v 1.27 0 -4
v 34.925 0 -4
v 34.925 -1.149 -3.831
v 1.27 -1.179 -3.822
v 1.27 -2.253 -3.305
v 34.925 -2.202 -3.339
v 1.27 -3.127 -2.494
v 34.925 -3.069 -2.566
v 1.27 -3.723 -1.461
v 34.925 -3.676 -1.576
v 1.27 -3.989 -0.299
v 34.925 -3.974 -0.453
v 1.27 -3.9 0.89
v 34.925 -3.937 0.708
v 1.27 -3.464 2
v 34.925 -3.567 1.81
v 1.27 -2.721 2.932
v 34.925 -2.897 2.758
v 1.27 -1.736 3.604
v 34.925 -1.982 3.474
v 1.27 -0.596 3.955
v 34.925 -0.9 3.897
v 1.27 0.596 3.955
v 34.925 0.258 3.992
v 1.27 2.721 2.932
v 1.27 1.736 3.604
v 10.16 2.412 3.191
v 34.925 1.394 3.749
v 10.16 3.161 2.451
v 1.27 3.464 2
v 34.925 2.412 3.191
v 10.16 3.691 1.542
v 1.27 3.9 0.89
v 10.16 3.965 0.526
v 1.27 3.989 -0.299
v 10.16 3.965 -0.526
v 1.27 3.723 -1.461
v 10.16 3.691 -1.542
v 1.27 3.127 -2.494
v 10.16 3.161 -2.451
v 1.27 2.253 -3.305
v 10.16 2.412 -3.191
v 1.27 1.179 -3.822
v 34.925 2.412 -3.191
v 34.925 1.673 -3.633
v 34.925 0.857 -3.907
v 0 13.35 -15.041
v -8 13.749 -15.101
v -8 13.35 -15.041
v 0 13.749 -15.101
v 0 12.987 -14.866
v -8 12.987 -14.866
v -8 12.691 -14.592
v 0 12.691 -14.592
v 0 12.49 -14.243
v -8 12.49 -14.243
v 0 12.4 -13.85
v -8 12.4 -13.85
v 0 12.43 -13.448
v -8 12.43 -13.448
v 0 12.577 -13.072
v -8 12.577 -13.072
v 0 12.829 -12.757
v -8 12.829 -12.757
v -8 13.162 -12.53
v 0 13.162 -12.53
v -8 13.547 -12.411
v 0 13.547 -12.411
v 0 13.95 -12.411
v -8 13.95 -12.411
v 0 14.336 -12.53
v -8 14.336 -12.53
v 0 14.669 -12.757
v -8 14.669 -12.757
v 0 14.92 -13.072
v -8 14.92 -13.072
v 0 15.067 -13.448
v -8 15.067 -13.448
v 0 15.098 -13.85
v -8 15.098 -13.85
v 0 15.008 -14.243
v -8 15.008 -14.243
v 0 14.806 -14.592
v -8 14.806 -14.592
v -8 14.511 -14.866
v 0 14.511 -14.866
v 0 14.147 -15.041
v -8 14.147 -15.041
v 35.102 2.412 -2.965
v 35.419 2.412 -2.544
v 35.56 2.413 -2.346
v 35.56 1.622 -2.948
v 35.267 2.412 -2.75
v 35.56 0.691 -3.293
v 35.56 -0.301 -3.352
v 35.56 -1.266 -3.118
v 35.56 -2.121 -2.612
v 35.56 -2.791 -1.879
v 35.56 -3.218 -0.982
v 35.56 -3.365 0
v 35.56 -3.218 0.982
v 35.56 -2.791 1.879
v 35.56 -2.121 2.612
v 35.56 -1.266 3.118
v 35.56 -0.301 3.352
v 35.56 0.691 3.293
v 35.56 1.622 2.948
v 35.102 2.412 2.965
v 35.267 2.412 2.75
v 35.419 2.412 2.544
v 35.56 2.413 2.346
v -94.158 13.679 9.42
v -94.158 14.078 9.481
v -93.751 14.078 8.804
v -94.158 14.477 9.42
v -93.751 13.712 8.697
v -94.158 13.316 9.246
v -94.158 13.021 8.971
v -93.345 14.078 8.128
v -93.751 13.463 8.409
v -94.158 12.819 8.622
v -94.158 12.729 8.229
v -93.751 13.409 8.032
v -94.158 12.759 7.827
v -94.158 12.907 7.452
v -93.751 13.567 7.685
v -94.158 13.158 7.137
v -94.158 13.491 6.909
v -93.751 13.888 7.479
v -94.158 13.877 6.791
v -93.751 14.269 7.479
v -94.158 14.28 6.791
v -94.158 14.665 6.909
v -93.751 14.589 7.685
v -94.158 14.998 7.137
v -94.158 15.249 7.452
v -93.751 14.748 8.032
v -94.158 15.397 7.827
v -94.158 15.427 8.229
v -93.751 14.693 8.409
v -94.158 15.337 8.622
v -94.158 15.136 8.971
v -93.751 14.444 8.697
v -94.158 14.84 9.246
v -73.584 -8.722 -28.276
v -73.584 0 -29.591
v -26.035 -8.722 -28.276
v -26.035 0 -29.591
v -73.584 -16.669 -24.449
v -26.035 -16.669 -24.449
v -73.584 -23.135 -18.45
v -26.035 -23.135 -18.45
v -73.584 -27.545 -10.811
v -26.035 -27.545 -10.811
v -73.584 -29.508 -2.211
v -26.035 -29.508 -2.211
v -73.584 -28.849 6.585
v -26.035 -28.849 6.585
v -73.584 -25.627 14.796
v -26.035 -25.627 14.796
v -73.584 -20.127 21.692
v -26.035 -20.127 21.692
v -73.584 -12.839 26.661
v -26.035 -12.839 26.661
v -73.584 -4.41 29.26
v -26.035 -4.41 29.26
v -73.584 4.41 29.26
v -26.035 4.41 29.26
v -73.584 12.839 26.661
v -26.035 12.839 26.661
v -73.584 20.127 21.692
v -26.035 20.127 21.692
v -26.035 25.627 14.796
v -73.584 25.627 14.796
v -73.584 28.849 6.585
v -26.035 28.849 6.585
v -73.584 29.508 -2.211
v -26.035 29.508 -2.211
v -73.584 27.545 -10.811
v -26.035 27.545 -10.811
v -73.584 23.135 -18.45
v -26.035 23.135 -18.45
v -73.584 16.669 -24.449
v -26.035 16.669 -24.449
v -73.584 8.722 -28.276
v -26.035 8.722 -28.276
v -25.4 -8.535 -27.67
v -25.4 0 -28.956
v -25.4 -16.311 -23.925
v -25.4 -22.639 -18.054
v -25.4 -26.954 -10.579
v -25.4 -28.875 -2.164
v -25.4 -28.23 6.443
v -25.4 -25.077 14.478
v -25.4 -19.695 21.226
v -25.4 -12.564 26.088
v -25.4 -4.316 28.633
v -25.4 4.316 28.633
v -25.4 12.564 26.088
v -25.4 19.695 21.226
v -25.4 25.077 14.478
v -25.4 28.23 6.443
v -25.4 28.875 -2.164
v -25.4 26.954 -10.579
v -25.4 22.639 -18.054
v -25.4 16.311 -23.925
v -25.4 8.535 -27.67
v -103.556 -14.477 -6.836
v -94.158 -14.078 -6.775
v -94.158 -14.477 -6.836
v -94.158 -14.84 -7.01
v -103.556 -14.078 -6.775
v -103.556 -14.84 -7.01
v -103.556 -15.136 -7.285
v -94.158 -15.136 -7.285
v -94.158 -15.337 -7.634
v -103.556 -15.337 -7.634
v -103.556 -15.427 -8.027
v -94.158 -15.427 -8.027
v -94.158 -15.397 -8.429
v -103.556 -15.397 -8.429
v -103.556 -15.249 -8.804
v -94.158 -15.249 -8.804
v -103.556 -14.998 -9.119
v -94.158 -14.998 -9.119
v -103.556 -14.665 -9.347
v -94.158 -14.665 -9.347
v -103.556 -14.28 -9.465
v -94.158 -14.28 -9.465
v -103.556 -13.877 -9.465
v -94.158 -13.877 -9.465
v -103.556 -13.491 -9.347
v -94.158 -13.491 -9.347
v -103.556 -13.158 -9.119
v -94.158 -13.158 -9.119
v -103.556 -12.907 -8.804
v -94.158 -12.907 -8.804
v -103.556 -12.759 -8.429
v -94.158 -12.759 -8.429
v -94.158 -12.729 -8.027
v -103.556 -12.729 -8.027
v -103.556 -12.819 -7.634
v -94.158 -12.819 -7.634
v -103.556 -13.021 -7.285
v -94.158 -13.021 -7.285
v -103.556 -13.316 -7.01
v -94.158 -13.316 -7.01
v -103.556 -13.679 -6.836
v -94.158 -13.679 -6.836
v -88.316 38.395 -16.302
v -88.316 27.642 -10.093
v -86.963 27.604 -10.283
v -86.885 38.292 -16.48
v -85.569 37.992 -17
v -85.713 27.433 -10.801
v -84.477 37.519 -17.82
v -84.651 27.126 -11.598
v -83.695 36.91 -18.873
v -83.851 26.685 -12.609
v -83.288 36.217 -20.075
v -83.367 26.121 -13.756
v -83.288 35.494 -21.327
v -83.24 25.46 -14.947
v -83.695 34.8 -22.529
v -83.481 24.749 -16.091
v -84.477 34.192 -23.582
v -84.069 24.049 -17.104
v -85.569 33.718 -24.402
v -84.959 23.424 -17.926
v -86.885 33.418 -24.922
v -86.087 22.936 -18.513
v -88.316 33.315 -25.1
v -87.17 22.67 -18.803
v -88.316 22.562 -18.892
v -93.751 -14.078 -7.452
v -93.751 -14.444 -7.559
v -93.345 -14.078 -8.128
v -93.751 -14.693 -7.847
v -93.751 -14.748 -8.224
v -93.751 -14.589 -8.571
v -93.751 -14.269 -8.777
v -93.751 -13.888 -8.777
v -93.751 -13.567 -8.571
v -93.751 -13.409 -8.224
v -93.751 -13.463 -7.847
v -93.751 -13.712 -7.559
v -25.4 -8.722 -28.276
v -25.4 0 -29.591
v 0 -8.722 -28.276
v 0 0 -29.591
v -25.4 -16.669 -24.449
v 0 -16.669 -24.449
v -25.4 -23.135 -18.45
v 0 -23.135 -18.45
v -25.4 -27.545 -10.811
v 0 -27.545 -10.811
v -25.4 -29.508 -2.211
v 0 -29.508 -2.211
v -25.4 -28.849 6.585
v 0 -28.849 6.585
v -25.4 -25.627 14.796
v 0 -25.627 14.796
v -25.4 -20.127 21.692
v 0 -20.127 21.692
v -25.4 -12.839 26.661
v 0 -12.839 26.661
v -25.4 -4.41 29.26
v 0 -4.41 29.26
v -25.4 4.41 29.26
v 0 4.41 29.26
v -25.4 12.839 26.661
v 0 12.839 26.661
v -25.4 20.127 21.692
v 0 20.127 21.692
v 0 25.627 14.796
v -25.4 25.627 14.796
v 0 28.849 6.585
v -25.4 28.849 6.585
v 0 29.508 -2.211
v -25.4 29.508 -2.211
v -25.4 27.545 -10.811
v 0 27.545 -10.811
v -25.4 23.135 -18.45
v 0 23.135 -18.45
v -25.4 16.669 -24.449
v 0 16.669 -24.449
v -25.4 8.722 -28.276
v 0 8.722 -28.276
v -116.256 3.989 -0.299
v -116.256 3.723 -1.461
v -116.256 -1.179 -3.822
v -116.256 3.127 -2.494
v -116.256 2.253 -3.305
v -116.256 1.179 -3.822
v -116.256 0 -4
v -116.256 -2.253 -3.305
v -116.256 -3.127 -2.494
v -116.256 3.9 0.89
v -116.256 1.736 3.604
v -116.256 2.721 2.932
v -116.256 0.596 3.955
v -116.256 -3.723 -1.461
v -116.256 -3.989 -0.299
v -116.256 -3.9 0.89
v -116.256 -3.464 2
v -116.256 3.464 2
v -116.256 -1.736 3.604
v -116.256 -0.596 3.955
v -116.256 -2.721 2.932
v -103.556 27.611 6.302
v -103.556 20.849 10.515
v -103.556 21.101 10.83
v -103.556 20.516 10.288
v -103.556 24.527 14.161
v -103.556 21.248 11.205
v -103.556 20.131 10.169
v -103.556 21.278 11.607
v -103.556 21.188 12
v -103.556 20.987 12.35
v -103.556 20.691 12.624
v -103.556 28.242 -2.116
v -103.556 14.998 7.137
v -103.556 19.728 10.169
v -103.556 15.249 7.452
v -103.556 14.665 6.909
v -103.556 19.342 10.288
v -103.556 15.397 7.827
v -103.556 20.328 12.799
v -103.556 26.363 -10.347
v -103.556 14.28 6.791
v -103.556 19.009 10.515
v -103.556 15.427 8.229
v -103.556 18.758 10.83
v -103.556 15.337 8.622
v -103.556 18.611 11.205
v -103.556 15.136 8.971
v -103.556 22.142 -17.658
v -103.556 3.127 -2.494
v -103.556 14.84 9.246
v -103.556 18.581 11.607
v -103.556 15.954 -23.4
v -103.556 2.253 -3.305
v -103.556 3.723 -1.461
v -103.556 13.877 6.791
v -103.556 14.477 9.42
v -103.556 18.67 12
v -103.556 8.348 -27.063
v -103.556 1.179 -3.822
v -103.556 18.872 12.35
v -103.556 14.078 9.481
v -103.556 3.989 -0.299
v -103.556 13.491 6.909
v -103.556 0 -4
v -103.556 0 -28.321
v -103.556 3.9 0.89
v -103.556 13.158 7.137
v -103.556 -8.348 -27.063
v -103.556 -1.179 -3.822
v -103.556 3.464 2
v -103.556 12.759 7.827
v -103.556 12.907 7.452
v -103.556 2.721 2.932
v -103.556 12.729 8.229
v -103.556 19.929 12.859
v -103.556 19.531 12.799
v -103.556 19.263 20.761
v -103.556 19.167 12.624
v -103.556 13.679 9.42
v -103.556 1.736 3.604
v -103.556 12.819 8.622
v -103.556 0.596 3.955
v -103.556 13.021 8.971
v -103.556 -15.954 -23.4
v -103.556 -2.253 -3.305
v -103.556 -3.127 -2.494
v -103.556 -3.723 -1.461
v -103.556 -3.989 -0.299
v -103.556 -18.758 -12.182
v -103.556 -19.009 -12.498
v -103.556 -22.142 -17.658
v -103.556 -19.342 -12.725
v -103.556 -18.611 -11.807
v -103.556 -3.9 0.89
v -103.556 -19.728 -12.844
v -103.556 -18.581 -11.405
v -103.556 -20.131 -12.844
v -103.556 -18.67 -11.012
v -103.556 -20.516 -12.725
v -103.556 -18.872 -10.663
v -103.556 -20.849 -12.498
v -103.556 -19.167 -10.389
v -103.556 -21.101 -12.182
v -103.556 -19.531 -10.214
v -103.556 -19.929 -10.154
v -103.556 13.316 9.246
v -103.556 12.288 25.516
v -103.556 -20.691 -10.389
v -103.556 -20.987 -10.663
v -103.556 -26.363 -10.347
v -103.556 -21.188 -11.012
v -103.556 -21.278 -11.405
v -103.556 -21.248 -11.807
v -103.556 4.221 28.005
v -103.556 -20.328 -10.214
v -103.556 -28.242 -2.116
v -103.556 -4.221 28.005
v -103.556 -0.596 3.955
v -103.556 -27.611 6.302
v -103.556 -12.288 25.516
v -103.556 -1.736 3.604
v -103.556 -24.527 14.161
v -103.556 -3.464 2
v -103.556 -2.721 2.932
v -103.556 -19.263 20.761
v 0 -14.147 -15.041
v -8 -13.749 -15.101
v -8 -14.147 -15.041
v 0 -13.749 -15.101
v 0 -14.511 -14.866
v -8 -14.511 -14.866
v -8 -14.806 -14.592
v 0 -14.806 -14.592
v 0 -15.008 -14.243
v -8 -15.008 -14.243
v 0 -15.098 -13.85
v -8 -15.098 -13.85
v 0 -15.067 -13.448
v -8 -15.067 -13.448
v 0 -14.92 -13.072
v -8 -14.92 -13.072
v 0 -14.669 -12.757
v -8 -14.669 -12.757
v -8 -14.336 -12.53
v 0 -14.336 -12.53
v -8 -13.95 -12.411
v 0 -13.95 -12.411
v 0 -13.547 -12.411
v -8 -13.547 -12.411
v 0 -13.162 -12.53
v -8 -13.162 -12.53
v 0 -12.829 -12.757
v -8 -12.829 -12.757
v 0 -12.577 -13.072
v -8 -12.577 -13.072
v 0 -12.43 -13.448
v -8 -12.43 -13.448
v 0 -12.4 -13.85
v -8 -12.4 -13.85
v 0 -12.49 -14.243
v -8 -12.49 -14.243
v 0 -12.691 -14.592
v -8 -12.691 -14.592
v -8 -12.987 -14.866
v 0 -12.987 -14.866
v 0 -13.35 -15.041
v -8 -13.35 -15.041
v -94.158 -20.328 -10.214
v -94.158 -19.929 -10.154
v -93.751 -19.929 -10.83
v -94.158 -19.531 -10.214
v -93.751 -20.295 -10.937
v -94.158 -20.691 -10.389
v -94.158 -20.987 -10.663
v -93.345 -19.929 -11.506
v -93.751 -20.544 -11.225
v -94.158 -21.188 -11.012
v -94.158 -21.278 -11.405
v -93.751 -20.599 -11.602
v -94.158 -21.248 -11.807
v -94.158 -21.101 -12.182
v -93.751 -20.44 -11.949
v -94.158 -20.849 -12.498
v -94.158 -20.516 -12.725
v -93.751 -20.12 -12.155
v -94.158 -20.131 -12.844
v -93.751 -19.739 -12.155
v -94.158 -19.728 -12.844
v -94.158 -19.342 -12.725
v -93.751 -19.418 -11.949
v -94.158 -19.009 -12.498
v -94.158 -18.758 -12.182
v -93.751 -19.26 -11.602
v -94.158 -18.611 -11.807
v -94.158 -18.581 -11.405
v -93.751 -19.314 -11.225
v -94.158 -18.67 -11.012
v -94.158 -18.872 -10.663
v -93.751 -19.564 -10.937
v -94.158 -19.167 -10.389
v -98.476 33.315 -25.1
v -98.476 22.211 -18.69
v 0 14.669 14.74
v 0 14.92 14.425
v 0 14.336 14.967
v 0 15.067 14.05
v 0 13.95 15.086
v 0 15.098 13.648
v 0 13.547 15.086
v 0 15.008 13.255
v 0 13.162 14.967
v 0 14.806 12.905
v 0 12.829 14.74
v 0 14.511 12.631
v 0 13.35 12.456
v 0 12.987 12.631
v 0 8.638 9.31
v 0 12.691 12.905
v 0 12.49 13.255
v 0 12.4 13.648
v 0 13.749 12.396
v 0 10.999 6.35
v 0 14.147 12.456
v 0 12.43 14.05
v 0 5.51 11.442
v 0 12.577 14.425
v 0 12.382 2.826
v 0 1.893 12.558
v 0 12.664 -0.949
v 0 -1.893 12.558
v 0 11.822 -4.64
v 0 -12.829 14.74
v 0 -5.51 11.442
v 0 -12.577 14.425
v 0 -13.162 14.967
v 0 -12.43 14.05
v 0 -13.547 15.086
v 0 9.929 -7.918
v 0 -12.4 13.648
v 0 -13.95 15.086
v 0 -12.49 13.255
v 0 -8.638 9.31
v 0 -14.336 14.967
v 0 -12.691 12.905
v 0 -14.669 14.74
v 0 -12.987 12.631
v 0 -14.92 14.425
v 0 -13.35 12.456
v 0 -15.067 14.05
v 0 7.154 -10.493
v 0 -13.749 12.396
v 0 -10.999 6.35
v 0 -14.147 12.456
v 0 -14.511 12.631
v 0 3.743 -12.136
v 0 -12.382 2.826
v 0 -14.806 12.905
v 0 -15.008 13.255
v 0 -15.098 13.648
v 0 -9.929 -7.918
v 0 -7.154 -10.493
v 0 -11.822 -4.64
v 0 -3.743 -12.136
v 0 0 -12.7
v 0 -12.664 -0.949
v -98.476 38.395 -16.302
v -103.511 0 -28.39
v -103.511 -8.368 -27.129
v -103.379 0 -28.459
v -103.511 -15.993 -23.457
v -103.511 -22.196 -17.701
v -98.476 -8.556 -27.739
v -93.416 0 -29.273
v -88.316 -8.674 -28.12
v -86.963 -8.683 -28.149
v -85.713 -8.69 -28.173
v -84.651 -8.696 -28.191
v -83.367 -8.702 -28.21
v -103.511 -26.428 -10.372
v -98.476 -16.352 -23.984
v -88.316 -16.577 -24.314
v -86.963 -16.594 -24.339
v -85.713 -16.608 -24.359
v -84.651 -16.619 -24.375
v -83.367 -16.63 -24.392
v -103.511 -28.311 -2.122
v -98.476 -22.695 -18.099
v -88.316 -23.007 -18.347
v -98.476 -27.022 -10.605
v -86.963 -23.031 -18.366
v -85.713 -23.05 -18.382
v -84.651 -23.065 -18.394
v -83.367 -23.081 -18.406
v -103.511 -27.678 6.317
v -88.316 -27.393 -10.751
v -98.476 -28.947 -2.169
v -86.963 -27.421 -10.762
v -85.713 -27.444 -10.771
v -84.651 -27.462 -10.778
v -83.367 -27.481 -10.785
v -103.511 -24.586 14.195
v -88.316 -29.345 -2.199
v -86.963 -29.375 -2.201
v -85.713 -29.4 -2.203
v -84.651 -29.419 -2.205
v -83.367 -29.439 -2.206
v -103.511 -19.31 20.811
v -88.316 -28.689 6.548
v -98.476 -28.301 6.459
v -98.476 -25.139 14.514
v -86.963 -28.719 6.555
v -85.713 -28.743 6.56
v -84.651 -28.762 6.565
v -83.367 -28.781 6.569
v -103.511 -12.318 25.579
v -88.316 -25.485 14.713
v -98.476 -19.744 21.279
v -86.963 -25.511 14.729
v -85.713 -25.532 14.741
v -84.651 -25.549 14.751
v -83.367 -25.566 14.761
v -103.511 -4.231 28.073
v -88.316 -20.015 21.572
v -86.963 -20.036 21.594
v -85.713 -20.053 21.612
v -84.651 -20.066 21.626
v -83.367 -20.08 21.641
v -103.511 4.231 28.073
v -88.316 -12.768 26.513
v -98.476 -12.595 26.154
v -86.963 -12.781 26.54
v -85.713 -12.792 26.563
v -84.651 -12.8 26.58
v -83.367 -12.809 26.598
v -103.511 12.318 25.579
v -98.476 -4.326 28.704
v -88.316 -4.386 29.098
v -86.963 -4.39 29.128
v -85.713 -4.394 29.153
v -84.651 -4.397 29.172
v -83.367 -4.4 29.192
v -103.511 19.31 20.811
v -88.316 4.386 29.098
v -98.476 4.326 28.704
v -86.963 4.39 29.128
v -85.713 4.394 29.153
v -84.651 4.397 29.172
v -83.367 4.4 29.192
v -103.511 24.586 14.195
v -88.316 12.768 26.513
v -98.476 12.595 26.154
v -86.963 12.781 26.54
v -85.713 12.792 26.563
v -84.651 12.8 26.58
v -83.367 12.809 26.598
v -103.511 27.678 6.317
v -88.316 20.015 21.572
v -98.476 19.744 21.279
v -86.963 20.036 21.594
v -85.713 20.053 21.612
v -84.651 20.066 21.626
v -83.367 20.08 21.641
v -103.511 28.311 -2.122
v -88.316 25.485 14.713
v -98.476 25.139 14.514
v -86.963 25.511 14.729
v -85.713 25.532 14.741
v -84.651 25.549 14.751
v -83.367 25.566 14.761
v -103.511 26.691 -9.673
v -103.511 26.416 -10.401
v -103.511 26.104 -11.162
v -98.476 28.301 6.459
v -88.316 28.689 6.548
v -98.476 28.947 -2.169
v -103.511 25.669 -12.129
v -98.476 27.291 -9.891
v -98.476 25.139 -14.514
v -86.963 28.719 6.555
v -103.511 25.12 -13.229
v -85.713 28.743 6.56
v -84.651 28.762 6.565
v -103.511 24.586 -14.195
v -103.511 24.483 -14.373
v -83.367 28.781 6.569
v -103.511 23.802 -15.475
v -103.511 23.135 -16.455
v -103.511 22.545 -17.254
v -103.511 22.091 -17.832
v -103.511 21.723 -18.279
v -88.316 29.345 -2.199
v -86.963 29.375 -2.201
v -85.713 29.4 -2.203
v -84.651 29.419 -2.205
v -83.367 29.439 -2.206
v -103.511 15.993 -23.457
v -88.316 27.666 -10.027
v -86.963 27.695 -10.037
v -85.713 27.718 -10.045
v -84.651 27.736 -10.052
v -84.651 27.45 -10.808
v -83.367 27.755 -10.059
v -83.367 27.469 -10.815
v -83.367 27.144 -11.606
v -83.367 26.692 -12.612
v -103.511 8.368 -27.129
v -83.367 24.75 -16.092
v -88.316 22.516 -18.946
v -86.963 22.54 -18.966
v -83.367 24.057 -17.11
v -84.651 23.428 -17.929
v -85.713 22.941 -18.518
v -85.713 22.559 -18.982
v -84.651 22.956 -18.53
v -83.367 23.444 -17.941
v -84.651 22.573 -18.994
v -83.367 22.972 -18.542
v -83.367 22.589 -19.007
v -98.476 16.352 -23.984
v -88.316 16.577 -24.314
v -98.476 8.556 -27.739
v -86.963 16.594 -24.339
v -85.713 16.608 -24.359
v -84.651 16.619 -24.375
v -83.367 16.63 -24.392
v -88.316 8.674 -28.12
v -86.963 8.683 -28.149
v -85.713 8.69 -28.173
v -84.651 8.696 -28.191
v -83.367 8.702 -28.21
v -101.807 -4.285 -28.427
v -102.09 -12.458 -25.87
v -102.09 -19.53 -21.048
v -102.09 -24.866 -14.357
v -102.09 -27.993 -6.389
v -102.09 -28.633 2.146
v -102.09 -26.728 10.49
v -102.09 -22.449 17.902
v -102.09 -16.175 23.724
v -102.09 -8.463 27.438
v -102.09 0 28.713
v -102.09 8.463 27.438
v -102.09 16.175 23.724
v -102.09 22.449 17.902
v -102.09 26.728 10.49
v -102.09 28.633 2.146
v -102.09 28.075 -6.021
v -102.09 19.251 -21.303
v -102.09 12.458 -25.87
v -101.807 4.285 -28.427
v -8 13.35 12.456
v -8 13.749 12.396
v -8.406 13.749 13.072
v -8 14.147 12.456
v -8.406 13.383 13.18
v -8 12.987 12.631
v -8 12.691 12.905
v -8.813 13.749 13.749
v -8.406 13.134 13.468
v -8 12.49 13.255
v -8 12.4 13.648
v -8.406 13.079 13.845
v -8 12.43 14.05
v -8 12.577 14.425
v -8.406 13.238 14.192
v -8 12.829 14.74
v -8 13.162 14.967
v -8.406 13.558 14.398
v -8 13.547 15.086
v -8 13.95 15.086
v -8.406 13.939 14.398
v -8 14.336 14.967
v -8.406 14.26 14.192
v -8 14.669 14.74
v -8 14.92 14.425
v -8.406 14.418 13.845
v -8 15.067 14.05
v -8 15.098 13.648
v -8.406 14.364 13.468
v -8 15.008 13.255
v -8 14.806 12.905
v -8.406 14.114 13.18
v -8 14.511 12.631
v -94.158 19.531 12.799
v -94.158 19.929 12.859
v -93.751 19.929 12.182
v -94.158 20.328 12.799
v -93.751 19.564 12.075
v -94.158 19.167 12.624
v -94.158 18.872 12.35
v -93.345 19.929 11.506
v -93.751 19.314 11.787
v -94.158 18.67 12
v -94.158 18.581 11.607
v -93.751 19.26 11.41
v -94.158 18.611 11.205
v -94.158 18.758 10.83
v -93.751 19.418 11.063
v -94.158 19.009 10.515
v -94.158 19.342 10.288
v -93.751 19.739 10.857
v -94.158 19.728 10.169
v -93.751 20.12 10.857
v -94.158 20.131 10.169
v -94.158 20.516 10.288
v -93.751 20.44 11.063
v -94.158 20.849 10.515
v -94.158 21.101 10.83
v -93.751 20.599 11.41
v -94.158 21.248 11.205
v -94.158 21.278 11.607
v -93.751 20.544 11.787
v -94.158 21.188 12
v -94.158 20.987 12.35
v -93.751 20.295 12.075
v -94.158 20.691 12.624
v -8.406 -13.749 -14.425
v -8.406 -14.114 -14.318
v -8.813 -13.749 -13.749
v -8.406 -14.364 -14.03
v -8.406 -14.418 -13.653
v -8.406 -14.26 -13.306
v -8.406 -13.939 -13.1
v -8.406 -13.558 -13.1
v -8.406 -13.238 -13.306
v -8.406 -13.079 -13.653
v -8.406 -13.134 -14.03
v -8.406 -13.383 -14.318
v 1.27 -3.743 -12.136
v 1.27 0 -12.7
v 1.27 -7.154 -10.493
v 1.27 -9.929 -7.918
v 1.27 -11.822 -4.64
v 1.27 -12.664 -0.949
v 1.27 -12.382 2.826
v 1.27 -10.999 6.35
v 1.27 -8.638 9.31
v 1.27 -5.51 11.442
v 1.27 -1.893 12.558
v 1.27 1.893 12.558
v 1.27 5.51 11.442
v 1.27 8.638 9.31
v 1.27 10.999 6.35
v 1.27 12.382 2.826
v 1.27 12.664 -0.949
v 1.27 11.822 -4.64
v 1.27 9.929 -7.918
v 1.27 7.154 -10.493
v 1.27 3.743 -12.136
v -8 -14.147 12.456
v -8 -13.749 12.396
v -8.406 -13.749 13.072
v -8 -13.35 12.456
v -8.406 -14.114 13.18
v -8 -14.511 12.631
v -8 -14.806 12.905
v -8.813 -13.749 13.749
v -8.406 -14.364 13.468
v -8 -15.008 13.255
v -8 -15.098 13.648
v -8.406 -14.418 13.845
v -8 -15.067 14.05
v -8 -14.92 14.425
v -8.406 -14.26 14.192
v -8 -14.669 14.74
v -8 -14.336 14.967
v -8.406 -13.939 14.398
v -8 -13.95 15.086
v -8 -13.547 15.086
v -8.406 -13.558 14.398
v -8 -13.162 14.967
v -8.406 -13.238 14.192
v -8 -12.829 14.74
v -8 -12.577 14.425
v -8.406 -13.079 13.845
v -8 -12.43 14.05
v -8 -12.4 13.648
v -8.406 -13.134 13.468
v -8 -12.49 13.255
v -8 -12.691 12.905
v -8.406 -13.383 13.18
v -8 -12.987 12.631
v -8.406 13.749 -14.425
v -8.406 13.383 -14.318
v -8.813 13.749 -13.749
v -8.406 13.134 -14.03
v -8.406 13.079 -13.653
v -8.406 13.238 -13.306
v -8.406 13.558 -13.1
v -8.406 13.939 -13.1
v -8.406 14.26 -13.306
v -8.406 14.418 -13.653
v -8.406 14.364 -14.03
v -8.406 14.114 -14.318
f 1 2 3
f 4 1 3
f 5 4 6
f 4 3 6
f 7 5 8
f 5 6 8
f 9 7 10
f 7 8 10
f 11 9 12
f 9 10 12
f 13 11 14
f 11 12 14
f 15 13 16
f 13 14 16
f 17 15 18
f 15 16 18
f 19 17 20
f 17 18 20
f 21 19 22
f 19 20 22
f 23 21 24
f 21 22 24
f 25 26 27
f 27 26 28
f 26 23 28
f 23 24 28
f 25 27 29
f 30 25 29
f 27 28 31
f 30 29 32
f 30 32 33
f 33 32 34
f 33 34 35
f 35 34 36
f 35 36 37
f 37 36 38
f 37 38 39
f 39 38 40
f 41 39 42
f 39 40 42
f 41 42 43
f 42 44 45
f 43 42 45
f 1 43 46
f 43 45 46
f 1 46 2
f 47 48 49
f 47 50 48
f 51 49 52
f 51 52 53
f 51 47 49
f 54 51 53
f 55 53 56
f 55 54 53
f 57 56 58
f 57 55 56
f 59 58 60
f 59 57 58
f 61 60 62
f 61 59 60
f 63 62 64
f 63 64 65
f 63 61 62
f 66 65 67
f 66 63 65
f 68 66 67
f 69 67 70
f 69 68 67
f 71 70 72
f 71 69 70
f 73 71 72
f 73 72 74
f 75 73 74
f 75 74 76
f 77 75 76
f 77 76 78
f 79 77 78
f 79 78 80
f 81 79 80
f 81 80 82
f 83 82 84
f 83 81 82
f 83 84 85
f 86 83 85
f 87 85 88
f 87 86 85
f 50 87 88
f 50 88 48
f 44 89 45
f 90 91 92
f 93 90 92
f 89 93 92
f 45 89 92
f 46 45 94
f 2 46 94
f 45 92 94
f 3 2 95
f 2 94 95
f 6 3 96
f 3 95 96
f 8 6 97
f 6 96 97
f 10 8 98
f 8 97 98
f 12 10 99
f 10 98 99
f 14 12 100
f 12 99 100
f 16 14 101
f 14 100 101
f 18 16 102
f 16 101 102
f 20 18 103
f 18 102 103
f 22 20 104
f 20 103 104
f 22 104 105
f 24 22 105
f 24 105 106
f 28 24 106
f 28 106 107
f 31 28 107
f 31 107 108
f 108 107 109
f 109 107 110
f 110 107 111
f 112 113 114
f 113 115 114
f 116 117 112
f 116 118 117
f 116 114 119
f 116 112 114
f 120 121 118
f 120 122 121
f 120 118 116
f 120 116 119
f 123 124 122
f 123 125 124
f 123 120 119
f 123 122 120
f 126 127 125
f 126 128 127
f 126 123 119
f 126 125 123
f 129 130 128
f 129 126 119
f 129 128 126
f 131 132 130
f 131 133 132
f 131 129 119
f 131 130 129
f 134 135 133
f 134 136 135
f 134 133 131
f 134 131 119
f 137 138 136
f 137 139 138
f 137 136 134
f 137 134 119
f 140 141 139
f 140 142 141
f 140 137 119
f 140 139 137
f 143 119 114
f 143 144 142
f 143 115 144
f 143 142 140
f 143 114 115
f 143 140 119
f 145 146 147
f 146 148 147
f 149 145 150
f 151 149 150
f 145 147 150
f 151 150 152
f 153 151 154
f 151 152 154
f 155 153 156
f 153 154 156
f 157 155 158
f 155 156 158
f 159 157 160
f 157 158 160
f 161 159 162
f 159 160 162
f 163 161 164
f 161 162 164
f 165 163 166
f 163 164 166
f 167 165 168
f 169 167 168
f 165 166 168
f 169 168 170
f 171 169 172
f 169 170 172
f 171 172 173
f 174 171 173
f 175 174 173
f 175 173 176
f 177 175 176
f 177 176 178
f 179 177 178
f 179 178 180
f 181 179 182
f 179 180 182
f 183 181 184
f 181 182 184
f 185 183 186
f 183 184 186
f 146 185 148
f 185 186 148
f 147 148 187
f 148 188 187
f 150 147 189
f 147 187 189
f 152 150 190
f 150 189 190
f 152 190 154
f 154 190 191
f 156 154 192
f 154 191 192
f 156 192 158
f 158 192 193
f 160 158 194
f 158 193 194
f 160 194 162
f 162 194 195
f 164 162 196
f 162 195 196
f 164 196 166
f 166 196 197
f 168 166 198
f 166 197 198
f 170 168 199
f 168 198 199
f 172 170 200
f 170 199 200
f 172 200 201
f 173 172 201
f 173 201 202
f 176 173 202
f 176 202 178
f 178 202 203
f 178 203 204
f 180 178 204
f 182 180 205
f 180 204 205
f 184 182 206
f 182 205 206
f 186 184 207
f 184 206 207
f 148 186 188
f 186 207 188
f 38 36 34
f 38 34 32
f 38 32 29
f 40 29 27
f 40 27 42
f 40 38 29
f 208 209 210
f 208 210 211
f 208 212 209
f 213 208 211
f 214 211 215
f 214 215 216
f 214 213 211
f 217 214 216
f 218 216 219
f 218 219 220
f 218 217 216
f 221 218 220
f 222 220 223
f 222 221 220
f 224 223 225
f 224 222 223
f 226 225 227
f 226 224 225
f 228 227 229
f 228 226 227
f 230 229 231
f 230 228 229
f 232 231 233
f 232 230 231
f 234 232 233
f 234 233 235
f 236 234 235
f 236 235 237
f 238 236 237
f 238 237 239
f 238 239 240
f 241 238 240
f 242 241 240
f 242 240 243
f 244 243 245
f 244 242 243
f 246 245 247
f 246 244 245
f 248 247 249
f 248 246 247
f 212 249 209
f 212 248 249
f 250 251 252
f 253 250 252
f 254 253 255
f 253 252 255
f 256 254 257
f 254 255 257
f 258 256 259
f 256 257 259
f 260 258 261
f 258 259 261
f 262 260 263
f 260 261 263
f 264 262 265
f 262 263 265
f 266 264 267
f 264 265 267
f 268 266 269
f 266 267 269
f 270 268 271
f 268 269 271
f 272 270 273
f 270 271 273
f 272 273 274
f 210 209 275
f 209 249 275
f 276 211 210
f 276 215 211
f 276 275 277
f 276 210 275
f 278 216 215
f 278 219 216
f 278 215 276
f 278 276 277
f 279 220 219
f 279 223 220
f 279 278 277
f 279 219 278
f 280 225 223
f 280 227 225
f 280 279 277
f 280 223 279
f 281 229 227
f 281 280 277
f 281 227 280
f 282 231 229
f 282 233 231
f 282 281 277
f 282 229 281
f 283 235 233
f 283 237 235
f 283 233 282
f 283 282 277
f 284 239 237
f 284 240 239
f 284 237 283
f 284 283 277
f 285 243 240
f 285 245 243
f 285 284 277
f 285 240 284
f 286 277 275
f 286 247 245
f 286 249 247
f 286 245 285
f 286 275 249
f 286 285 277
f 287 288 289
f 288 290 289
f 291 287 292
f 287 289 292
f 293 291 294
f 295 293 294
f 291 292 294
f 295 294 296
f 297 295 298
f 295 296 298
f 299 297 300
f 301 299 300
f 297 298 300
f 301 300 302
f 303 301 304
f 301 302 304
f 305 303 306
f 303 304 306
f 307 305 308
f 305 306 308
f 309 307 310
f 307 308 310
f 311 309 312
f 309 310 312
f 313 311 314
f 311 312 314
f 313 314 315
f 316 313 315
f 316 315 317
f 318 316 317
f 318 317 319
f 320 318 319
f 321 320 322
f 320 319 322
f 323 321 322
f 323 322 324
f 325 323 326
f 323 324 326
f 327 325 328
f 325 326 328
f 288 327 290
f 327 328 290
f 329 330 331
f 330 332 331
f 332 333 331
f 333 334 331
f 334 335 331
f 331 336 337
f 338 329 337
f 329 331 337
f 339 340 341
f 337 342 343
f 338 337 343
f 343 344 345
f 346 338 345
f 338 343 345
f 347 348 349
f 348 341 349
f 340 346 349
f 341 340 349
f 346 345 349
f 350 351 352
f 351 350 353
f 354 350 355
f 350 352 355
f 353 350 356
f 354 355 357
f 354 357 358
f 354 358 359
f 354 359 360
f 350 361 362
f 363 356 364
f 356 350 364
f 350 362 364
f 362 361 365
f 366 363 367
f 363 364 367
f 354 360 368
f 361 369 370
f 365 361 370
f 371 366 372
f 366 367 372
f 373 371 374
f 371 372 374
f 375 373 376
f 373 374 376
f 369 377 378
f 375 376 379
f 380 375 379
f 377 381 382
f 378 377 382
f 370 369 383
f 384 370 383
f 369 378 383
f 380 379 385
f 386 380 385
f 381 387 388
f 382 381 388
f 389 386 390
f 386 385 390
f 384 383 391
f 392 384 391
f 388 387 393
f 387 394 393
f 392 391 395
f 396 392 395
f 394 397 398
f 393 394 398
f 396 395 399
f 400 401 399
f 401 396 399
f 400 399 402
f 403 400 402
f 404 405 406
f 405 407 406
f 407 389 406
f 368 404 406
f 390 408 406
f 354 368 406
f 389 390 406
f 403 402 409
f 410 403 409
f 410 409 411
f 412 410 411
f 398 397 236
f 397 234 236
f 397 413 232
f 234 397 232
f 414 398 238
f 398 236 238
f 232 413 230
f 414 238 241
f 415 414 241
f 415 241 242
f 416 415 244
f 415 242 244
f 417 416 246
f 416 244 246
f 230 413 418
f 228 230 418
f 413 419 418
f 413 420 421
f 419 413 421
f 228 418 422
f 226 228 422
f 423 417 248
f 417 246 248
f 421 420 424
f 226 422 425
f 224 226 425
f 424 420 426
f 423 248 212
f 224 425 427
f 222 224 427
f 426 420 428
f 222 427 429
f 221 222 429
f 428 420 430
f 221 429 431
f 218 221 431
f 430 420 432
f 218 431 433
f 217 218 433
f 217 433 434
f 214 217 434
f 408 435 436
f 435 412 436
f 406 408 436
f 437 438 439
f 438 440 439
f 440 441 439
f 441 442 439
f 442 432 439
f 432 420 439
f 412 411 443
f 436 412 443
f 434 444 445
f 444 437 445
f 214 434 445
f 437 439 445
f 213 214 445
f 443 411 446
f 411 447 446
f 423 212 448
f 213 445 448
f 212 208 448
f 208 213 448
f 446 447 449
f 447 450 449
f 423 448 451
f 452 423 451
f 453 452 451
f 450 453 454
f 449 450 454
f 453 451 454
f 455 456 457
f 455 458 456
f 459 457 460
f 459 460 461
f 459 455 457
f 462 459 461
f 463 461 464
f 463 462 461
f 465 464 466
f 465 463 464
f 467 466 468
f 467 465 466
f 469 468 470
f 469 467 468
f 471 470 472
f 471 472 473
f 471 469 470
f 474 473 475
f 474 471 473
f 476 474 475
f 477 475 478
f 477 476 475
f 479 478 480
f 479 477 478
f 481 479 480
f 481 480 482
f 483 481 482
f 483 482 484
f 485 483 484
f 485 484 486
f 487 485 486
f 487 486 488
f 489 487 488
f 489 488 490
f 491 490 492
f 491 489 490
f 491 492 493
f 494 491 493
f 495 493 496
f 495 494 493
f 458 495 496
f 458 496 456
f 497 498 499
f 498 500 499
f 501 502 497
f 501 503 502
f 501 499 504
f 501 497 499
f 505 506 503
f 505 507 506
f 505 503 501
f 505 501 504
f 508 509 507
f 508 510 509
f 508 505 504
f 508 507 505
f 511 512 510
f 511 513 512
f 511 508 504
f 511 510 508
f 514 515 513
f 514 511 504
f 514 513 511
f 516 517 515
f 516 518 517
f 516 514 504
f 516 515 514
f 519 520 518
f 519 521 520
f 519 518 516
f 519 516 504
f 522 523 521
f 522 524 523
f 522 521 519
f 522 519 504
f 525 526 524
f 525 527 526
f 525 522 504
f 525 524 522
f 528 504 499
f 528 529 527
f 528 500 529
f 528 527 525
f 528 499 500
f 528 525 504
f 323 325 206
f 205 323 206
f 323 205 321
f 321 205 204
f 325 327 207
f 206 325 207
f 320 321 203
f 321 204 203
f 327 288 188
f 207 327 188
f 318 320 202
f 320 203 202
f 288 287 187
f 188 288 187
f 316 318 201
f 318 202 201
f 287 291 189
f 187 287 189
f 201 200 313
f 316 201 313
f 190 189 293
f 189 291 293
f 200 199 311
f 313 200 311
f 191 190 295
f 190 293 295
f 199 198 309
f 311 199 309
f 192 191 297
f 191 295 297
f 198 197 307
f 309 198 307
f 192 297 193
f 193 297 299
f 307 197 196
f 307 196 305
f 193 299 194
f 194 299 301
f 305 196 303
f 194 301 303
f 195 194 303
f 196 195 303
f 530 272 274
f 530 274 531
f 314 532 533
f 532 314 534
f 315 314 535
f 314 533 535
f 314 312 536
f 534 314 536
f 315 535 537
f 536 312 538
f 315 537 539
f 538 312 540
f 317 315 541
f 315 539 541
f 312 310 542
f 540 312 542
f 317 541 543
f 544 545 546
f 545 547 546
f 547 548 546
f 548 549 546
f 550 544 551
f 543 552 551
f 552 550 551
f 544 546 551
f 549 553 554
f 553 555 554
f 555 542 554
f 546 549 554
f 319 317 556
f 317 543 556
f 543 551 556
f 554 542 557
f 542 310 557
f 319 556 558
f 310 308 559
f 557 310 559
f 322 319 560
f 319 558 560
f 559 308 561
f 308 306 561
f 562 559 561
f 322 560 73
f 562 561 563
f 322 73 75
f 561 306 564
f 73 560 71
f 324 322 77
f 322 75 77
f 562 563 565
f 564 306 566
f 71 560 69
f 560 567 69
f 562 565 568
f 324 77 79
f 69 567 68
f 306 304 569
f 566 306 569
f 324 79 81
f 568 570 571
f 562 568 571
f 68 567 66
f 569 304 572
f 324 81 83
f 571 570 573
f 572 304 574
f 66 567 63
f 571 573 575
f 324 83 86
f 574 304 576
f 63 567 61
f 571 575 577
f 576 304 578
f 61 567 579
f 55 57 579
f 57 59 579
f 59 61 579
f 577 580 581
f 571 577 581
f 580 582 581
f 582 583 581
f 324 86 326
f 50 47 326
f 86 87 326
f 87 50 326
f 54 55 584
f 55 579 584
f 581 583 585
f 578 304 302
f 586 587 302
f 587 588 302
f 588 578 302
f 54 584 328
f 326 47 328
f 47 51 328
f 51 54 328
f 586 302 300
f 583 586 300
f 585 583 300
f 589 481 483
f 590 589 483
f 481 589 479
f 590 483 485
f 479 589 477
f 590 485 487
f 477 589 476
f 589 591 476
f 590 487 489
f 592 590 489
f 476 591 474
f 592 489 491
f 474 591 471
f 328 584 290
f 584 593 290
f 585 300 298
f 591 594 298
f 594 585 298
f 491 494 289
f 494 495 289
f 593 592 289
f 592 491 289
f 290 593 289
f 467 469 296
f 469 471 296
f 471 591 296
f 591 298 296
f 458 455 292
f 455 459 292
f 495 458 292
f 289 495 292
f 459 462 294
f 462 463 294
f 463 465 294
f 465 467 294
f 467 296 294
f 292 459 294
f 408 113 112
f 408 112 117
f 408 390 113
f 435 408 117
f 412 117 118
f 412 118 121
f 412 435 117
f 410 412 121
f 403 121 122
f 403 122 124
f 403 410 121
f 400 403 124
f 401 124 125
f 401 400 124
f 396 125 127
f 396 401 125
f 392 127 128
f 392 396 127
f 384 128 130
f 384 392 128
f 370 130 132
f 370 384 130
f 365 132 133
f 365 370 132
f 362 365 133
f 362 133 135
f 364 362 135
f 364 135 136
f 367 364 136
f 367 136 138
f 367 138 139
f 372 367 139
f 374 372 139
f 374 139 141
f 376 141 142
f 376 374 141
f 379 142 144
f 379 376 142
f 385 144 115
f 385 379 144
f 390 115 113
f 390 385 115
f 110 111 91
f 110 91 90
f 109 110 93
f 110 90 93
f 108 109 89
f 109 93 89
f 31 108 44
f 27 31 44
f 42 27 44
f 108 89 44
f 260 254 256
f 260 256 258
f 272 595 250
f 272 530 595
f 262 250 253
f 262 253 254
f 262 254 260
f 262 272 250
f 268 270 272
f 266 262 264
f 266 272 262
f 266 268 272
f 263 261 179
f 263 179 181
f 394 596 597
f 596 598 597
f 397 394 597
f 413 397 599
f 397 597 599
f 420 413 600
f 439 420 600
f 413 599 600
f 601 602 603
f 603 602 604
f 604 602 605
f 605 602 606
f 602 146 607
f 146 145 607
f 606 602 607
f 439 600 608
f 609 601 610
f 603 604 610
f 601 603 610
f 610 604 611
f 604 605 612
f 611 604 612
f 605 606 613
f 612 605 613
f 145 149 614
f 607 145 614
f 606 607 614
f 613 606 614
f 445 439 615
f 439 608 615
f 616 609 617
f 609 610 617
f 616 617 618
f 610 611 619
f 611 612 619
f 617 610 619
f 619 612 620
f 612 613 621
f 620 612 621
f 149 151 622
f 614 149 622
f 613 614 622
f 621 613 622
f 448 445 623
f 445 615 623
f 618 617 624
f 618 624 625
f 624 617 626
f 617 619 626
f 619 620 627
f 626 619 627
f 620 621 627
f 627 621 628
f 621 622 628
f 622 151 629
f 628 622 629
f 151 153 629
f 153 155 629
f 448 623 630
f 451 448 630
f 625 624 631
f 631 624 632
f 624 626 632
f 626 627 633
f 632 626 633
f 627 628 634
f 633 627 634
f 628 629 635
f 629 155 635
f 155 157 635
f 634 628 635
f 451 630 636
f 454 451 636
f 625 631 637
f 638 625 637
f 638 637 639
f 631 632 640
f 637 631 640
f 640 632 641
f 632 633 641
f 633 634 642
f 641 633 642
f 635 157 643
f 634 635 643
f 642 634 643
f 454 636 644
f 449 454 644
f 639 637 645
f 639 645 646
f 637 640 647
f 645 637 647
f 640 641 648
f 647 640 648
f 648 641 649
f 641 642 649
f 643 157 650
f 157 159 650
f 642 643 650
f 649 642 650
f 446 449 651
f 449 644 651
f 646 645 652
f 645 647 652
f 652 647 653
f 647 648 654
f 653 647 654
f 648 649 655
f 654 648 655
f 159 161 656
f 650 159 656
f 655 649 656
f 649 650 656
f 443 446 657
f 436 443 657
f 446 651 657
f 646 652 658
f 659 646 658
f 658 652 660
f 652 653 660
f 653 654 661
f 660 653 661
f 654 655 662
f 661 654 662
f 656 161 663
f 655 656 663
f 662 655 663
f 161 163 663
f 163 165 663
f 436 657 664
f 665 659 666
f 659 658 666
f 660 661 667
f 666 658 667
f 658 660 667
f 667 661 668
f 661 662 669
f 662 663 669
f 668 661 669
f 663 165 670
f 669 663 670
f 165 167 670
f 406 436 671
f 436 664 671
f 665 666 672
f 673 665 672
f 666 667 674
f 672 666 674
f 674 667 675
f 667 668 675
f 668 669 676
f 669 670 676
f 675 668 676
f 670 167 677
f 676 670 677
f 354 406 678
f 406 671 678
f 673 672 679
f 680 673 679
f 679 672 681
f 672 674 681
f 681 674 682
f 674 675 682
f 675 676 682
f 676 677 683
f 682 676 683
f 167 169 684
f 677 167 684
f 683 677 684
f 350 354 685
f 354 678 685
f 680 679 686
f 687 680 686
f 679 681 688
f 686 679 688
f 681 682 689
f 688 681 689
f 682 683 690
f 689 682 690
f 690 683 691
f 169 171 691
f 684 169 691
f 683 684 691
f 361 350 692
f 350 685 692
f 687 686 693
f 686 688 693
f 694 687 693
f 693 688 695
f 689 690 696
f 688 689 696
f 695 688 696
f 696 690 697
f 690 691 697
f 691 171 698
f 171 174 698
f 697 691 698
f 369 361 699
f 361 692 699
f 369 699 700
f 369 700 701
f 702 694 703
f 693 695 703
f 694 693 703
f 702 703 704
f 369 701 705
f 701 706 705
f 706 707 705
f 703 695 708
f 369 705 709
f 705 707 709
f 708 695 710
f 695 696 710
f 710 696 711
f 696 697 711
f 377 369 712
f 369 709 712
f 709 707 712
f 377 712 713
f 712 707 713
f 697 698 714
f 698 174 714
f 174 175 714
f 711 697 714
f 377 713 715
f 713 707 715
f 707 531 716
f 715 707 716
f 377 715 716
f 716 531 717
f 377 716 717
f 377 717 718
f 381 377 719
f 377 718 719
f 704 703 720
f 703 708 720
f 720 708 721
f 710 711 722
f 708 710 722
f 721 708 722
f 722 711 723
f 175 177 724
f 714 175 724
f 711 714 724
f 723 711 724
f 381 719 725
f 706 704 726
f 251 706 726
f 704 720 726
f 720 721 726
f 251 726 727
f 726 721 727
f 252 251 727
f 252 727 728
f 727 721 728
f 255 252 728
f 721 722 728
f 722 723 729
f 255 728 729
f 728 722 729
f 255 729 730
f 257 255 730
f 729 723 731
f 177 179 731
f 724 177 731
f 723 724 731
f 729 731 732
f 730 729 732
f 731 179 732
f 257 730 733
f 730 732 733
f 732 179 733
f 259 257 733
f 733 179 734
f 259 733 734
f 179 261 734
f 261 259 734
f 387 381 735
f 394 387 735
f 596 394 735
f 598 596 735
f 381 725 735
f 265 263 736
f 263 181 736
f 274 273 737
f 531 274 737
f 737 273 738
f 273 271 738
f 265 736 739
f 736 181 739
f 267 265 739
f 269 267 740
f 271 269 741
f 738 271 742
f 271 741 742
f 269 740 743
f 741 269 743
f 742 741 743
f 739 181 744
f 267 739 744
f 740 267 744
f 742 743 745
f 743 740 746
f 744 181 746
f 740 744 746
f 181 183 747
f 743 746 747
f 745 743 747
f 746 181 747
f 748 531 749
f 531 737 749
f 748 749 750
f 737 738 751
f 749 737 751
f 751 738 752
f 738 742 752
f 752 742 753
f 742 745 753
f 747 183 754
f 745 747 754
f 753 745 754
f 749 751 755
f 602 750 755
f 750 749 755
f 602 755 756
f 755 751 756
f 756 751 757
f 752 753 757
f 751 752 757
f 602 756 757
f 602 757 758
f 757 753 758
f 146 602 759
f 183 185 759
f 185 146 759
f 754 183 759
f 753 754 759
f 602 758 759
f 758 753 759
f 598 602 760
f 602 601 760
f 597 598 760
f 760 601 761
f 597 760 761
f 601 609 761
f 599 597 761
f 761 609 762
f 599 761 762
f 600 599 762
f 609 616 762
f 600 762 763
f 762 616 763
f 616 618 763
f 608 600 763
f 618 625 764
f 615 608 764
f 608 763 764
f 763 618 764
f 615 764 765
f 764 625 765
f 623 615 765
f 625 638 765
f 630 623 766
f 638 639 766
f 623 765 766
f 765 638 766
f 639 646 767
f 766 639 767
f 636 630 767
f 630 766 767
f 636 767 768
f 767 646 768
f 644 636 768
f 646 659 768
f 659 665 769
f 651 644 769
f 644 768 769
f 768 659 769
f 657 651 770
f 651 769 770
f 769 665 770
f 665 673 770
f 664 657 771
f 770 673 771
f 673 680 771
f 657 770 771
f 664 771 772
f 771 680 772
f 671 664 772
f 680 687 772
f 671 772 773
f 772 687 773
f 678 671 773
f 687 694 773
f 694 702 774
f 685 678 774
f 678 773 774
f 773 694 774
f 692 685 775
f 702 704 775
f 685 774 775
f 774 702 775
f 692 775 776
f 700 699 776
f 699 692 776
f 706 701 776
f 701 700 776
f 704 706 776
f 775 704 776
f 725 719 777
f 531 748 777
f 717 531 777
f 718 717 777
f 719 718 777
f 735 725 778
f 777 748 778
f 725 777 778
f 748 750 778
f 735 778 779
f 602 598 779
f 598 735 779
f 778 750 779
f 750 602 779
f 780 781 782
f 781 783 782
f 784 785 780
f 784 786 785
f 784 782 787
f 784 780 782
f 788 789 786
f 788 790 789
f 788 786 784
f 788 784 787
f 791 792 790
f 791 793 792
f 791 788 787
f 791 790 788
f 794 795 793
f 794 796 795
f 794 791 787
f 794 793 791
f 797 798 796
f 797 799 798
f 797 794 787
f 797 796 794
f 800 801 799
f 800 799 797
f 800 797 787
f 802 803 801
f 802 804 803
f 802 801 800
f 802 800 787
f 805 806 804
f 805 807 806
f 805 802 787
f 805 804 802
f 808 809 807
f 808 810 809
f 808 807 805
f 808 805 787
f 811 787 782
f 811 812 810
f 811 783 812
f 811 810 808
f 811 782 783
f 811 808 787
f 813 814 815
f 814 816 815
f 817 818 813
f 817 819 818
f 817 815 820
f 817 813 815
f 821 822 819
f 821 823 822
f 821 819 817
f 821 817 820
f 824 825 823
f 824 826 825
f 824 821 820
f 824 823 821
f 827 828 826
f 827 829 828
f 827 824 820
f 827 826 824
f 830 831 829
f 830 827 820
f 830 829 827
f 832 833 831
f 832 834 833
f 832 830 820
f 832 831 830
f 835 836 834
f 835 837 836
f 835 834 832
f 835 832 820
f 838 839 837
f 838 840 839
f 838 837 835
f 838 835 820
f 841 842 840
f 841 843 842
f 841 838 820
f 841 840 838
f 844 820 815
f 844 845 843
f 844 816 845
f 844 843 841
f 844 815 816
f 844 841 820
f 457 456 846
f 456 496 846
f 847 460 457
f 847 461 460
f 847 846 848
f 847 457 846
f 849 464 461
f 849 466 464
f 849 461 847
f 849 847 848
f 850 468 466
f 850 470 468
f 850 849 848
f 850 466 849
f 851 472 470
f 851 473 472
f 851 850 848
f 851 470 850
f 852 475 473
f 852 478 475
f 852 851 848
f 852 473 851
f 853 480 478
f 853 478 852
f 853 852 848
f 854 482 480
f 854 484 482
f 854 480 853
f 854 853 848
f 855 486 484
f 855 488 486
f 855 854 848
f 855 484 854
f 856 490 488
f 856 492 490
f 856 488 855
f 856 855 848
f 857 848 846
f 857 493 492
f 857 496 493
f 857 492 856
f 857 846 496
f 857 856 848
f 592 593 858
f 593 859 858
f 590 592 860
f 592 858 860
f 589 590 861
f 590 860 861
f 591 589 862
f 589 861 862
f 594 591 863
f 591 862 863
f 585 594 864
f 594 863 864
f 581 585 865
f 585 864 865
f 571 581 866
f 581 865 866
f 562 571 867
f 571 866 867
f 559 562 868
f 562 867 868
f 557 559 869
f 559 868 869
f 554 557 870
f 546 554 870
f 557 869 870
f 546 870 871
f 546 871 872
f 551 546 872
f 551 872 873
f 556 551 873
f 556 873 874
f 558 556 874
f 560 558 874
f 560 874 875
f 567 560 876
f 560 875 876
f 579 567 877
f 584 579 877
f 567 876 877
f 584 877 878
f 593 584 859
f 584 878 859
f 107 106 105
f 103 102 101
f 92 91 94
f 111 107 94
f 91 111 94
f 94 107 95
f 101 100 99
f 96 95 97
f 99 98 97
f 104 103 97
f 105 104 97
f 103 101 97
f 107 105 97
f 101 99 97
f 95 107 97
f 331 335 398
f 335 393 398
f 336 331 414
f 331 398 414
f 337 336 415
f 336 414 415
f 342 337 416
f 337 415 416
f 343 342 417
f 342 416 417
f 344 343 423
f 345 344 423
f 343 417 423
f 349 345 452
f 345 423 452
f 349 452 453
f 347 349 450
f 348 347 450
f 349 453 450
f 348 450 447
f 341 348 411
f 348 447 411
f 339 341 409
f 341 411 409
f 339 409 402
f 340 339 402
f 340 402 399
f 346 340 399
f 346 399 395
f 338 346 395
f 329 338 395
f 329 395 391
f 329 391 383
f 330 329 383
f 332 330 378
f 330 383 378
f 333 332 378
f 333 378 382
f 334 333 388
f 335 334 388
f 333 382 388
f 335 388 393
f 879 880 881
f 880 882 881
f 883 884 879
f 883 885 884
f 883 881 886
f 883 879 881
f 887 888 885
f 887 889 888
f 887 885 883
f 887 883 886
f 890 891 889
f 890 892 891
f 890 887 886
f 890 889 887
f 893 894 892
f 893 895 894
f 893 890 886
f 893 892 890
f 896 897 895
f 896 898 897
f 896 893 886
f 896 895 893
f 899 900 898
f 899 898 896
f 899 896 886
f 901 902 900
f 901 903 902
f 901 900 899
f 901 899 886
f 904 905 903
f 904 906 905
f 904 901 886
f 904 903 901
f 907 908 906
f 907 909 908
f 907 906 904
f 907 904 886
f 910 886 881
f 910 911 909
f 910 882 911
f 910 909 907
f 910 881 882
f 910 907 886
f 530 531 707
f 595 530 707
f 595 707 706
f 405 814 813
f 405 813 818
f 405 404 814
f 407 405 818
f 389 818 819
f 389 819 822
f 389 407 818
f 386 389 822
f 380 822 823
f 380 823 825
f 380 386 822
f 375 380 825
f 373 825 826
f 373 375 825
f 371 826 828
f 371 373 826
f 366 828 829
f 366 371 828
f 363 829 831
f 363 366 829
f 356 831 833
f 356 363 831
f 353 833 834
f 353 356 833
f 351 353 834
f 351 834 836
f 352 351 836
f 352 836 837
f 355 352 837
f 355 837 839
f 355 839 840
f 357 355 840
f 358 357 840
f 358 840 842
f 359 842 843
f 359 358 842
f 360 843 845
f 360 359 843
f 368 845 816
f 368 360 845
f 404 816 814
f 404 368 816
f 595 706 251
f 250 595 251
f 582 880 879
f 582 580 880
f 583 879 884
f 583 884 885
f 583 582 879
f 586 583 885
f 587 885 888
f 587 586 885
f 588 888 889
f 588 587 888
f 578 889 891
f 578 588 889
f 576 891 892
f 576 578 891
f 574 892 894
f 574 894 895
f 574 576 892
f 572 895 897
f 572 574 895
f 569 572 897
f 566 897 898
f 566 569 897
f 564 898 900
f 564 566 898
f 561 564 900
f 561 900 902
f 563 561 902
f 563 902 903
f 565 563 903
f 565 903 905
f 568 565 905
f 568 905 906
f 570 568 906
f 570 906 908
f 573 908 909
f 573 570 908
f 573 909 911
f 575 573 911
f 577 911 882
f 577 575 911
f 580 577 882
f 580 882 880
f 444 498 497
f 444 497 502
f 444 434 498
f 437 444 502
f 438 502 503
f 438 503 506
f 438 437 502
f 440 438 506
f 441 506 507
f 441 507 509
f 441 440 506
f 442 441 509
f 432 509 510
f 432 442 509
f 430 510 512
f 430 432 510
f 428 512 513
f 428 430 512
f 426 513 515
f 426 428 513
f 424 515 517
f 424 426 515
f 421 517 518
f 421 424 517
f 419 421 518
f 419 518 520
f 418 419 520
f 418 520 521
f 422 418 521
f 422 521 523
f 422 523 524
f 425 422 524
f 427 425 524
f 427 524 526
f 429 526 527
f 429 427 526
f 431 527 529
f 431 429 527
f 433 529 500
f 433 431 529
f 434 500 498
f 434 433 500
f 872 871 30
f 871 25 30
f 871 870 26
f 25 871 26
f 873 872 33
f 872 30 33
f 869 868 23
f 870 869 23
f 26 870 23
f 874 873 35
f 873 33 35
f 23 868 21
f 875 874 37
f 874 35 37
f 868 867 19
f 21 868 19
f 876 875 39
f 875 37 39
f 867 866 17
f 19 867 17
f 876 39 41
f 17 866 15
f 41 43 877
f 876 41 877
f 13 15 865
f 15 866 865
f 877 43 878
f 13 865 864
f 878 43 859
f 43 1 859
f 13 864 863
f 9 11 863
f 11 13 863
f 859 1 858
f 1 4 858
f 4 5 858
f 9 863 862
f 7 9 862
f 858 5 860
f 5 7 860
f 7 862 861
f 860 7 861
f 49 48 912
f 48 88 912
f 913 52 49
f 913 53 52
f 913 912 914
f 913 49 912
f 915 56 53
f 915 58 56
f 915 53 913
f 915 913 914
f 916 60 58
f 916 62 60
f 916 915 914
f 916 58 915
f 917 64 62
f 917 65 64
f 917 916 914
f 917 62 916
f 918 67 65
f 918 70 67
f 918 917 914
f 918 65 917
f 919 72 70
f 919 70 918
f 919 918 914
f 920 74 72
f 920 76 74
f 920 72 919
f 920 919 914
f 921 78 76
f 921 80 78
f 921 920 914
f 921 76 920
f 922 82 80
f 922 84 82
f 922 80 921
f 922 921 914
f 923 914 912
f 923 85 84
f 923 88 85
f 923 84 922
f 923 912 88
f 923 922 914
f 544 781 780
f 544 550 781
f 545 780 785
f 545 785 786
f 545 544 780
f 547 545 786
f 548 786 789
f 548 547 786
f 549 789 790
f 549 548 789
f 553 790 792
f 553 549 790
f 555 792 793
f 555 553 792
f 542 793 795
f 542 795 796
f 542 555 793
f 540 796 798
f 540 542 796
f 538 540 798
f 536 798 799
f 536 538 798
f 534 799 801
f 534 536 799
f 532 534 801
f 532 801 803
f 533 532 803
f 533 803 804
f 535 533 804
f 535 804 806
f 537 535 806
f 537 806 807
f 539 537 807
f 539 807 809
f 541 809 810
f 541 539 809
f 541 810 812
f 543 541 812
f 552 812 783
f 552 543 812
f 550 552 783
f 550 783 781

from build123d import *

# Parameters (mm, degrees)
FILLET1_SIZE                   = 1.27
FILLET1_SIZE_2                 = 29.972
SKETCH3_W                      = 6.381173482
SKETCH3_H                      = 3.175
CUT_EXTRUDE1_DEPTH             = 25.4
F_6_32_TAPPED_HOLE2_AT_2_COUNT = 2
F_6_32_TAPPED_HOLE2_AT_2_PITCH = 27.497544243
F_6_32_TAPPED_HOLE2_AT_3_COUNT = 2
F_6_32_TAPPED_HOLE2_AT_3_PITCH = 38.8874
F_6_32_TAPPED_HOLE2_AT_4_COUNT = 2
F_6_32_TAPPED_HOLE2_AT_4_PITCH = 27.497544243
F_6_32_TAPPED_HOLE1_AT_2_COUNT = 2
F_6_32_TAPPED_HOLE1_AT_2_PITCH = 46.0248
F_6_32_TAPPED_HOLE1_AT_3_COUNT = 2
F_6_32_TAPPED_HOLE1_AT_3_PITCH = 39.2684
F_6_32_TAPPED_HOLE1_AT_4_COUNT = 2
F_6_32_TAPPED_HOLE1_AT_4_PITCH = 6.7564
BOSS_EXTRUDE1_DEPTH            = 41.402


with BuildPart() as part:
    # Sketch2 → Revolve1 (revolve)
    with BuildSketch(Plane.XY, mode=Mode.PRIVATE) as revolve1_sk:
        Polygon((35.56, 0), (-116.2558, 0), (-116.2558, 4), (-103.5558, 4), (-103.5558, 29.591), (-26.035, 29.591), (-25.4, 28.956), (-25.4, 29.591), (0, 29.591), (0, 12.7), (1.27, 12.7), (1.27, 4), (34.925, 4), (35.56, 3.365), align=None)
    revolve(revolve1_sk.sketch.rotate(Axis((88.99, 0, 0), (-1, 0, 0)), 90), axis=Axis((88.99, 0, 0), (-1, 0, 0)))

    # Fillet1
    # an asymmetric fillet: 29.972, 1.27 mm, written as the material it takes off along each edge
    with BuildSketch(Plane(origin=(-103.5558, 0, 0), x_dir=(0, 0, -1), z_dir=(0, 1, 0))) as fillet1_piece_1:
        with BuildLine():
            Bezier((29.591 - FILLET1_SIZE, 0), (29.591, 0), (29.591, -FILLET1_SIZE_2), weights=[1, 0.707106781, 1])
            Line((29.591, -FILLET1_SIZE_2), (29.591, 0))
            Line((29.591, 0), (29.591 - FILLET1_SIZE, 0))
        make_face()
    revolve(axis=Axis((-103.5558, 0, 0), (-1, 0, 0)), mode=Mode.SUBTRACT)

    # Sketch3 → Cut-Extrude1 (cut)
    with BuildSketch(Plane(origin=(35.56, 0, 0), x_dir=(0, 0, -1), z_dir=(1, 0, 0))):
        with Locations((0, 4)):
            Rectangle(SKETCH3_W, SKETCH3_H)
    extrude(amount=-CUT_EXTRUDE1_DEPTH, mode=Mode.SUBTRACT)

    # Sketch8 → #6-32 Tapped Hole2 (revolve, cut)
    with BuildSketch(Plane(origin=(0, 13.748772121, 13.748772121), x_dir=(0, 0, -1), z_dir=(0, 1, 0))):
        Polygon((0, 0), (0, 8.81270343), (1.35255, 8.0000094), (1.35255, 0), align=None)
    f_6_32_tapped_hole2 = revolve(axis=Axis((6.35, 13.748772121, 13.748772121), (-1, 0, 0)), mode=Mode.SUBTRACT)

    # #6-32 Tapped Hole2 at 2: #6-32 Tapped Hole2 ×2
    with Locations(*[(0, 0, -i * F_6_32_TAPPED_HOLE2_AT_2_PITCH) for i in range(1, F_6_32_TAPPED_HOLE2_AT_2_COUNT)]):
        add(f_6_32_tapped_hole2, mode=Mode.SUBTRACT)

    # #6-32 Tapped Hole2 at 3: #6-32 Tapped Hole2 ×2
    with Locations(*[Vector(0, -0.7071067811865461, -0.7071067811865489) * (i * F_6_32_TAPPED_HOLE2_AT_3_PITCH) for i in range(1, F_6_32_TAPPED_HOLE2_AT_3_COUNT)]):
        add(f_6_32_tapped_hole2, mode=Mode.SUBTRACT)

    # #6-32 Tapped Hole2 at 4: #6-32 Tapped Hole2 ×2
    with Locations(*[(0, -i * F_6_32_TAPPED_HOLE2_AT_4_PITCH, 0) for i in range(1, F_6_32_TAPPED_HOLE2_AT_4_COUNT)]):
        add(f_6_32_tapped_hole2, mode=Mode.SUBTRACT)

    # Sketch7 → #6-32 Tapped Hole1 (revolve, cut)
    with BuildSketch(Plane(origin=(-103.5558, -19.929323002, -11.5062), x_dir=(0, 0, 1), z_dir=(0, 1, 0))):
        Polygon((0, 0), (0, 10.21069403), (1.35255, 9.398), (1.35255, 0), align=None)
    f_6_32_tapped_hole1 = revolve(axis=Axis((-109.9058, -19.929323002, -11.5062), (1, 0, 0)), mode=Mode.SUBTRACT)

    # #6-32 Tapped Hole1 at 2: #6-32 Tapped Hole1 ×2
    with Locations(*[Vector(0, 0.8660254037844364, 0.5000000000000039) * (i * F_6_32_TAPPED_HOLE1_AT_2_PITCH) for i in range(1, F_6_32_TAPPED_HOLE1_AT_2_COUNT)]):
        add(f_6_32_tapped_hole1, mode=Mode.SUBTRACT)

    # #6-32 Tapped Hole1 at 3: #6-32 Tapped Hole1 ×2
    with Locations(*[Vector(0, 0.8660254037844366, 0.5000000000000038) * (i * F_6_32_TAPPED_HOLE1_AT_3_PITCH) for i in range(1, F_6_32_TAPPED_HOLE1_AT_3_COUNT)]):
        add(f_6_32_tapped_hole1, mode=Mode.SUBTRACT)

    # #6-32 Tapped Hole1 at 4: #6-32 Tapped Hole1 ×2
    with Locations(*[Vector(0, 0.8660254037844365, 0.5000000000000039) * (i * F_6_32_TAPPED_HOLE1_AT_4_PITCH) for i in range(1, F_6_32_TAPPED_HOLE1_AT_4_COUNT)]):
        add(f_6_32_tapped_hole1, mode=Mode.SUBTRACT)

    # Sketch12 → Boss-Extrude1 (add)
    with BuildSketch(Plane(origin=(0, 0, 0), x_dir=(1, 0, 0), z_dir=(0, 0.866025403784438, -0.500000000000001))):
        with BuildLine():
            Line((-98.4758, -5.08), (-88.3158, -5.08))
            ThreePointArc((-88.3158, -5.08), (-83.2358, 0), (-88.3158, 5.08))
            Line((-88.3158, 5.08), (-98.4758, 5.08))
            Line((-98.4758, 5.08), (-98.4758, -5.08))
        make_face()
    extrude(amount=BOSS_EXTRUDE1_DEPTH)


solid = part.part
